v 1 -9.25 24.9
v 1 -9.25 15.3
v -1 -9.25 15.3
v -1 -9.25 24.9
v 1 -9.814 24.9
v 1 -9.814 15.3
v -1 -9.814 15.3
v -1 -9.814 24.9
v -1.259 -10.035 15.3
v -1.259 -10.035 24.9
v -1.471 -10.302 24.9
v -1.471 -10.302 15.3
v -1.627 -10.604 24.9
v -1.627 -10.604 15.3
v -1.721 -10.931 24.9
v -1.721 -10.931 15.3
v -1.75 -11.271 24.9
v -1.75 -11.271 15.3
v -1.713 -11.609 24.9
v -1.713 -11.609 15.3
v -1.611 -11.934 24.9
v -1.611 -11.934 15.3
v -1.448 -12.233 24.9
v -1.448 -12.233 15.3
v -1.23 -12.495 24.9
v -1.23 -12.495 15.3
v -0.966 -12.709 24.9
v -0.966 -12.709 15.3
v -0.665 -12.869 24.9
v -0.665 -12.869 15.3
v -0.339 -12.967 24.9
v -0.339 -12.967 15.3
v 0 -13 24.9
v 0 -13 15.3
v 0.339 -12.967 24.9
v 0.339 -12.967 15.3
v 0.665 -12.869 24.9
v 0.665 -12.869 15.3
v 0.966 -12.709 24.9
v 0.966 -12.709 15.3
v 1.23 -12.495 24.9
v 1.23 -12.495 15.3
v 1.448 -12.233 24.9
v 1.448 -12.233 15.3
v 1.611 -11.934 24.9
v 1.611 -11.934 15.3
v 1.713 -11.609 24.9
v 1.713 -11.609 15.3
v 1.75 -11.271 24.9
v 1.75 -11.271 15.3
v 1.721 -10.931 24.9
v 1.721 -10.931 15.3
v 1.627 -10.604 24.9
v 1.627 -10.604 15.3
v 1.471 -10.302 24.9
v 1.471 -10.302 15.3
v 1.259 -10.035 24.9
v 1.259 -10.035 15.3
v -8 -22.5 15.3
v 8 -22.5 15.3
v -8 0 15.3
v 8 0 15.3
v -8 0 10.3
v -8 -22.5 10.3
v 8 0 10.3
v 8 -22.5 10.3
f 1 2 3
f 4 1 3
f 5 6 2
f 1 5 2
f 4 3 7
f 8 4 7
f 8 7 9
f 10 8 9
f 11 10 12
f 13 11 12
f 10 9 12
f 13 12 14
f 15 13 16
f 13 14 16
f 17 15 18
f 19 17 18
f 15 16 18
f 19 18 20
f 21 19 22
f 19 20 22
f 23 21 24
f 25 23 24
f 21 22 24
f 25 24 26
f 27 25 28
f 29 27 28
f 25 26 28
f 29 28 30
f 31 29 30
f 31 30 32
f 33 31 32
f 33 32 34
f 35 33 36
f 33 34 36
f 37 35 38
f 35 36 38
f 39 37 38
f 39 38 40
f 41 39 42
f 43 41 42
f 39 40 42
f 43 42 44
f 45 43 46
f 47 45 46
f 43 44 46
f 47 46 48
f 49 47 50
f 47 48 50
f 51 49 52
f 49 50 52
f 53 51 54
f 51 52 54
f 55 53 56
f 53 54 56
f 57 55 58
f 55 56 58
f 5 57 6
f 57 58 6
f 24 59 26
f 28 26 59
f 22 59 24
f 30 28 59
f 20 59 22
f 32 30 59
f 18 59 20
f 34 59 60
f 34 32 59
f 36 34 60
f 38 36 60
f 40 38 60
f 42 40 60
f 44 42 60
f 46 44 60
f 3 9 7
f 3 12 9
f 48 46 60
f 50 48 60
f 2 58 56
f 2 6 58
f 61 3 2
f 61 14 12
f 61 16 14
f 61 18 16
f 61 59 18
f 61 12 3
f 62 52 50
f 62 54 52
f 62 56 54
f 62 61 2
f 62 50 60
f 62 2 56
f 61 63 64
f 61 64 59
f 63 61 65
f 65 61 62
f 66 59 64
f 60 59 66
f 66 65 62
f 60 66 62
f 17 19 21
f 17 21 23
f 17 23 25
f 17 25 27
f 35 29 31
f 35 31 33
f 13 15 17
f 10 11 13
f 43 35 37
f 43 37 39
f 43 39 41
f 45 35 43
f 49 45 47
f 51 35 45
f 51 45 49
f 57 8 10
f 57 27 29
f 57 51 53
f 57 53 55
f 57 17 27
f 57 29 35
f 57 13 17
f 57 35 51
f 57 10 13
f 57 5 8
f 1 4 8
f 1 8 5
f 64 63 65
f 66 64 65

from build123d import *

# Parameters (mm, degrees)
F0_W     = 16
F0_H     = 5
F1_DEPTH = 22.5
F3_DEPTH = 9.6


with BuildPart() as f1:
    # F0 (on Front) → F1 (new body)
    with BuildSketch(Plane.XZ):
        with Locations((0, 12.8)):
            Rectangle(F0_W, F0_H)
    extrude(amount=F1_DEPTH)

    # F2 (on face) → F3 (join)
    with BuildSketch(Plane.XY.offset(15.3)):
        with BuildLine():
            Line((-1, -9.25), (-1, -9.813859))
            ThreePointArc((-1, -9.813859), (0, -13), (1, -9.813859))
            Line((1, -9.813859), (1, -9.25))
            Line((1, -9.25), (-1, -9.25))
        make_face()
    extrude(amount=F3_DEPTH)


solid = f1.part
